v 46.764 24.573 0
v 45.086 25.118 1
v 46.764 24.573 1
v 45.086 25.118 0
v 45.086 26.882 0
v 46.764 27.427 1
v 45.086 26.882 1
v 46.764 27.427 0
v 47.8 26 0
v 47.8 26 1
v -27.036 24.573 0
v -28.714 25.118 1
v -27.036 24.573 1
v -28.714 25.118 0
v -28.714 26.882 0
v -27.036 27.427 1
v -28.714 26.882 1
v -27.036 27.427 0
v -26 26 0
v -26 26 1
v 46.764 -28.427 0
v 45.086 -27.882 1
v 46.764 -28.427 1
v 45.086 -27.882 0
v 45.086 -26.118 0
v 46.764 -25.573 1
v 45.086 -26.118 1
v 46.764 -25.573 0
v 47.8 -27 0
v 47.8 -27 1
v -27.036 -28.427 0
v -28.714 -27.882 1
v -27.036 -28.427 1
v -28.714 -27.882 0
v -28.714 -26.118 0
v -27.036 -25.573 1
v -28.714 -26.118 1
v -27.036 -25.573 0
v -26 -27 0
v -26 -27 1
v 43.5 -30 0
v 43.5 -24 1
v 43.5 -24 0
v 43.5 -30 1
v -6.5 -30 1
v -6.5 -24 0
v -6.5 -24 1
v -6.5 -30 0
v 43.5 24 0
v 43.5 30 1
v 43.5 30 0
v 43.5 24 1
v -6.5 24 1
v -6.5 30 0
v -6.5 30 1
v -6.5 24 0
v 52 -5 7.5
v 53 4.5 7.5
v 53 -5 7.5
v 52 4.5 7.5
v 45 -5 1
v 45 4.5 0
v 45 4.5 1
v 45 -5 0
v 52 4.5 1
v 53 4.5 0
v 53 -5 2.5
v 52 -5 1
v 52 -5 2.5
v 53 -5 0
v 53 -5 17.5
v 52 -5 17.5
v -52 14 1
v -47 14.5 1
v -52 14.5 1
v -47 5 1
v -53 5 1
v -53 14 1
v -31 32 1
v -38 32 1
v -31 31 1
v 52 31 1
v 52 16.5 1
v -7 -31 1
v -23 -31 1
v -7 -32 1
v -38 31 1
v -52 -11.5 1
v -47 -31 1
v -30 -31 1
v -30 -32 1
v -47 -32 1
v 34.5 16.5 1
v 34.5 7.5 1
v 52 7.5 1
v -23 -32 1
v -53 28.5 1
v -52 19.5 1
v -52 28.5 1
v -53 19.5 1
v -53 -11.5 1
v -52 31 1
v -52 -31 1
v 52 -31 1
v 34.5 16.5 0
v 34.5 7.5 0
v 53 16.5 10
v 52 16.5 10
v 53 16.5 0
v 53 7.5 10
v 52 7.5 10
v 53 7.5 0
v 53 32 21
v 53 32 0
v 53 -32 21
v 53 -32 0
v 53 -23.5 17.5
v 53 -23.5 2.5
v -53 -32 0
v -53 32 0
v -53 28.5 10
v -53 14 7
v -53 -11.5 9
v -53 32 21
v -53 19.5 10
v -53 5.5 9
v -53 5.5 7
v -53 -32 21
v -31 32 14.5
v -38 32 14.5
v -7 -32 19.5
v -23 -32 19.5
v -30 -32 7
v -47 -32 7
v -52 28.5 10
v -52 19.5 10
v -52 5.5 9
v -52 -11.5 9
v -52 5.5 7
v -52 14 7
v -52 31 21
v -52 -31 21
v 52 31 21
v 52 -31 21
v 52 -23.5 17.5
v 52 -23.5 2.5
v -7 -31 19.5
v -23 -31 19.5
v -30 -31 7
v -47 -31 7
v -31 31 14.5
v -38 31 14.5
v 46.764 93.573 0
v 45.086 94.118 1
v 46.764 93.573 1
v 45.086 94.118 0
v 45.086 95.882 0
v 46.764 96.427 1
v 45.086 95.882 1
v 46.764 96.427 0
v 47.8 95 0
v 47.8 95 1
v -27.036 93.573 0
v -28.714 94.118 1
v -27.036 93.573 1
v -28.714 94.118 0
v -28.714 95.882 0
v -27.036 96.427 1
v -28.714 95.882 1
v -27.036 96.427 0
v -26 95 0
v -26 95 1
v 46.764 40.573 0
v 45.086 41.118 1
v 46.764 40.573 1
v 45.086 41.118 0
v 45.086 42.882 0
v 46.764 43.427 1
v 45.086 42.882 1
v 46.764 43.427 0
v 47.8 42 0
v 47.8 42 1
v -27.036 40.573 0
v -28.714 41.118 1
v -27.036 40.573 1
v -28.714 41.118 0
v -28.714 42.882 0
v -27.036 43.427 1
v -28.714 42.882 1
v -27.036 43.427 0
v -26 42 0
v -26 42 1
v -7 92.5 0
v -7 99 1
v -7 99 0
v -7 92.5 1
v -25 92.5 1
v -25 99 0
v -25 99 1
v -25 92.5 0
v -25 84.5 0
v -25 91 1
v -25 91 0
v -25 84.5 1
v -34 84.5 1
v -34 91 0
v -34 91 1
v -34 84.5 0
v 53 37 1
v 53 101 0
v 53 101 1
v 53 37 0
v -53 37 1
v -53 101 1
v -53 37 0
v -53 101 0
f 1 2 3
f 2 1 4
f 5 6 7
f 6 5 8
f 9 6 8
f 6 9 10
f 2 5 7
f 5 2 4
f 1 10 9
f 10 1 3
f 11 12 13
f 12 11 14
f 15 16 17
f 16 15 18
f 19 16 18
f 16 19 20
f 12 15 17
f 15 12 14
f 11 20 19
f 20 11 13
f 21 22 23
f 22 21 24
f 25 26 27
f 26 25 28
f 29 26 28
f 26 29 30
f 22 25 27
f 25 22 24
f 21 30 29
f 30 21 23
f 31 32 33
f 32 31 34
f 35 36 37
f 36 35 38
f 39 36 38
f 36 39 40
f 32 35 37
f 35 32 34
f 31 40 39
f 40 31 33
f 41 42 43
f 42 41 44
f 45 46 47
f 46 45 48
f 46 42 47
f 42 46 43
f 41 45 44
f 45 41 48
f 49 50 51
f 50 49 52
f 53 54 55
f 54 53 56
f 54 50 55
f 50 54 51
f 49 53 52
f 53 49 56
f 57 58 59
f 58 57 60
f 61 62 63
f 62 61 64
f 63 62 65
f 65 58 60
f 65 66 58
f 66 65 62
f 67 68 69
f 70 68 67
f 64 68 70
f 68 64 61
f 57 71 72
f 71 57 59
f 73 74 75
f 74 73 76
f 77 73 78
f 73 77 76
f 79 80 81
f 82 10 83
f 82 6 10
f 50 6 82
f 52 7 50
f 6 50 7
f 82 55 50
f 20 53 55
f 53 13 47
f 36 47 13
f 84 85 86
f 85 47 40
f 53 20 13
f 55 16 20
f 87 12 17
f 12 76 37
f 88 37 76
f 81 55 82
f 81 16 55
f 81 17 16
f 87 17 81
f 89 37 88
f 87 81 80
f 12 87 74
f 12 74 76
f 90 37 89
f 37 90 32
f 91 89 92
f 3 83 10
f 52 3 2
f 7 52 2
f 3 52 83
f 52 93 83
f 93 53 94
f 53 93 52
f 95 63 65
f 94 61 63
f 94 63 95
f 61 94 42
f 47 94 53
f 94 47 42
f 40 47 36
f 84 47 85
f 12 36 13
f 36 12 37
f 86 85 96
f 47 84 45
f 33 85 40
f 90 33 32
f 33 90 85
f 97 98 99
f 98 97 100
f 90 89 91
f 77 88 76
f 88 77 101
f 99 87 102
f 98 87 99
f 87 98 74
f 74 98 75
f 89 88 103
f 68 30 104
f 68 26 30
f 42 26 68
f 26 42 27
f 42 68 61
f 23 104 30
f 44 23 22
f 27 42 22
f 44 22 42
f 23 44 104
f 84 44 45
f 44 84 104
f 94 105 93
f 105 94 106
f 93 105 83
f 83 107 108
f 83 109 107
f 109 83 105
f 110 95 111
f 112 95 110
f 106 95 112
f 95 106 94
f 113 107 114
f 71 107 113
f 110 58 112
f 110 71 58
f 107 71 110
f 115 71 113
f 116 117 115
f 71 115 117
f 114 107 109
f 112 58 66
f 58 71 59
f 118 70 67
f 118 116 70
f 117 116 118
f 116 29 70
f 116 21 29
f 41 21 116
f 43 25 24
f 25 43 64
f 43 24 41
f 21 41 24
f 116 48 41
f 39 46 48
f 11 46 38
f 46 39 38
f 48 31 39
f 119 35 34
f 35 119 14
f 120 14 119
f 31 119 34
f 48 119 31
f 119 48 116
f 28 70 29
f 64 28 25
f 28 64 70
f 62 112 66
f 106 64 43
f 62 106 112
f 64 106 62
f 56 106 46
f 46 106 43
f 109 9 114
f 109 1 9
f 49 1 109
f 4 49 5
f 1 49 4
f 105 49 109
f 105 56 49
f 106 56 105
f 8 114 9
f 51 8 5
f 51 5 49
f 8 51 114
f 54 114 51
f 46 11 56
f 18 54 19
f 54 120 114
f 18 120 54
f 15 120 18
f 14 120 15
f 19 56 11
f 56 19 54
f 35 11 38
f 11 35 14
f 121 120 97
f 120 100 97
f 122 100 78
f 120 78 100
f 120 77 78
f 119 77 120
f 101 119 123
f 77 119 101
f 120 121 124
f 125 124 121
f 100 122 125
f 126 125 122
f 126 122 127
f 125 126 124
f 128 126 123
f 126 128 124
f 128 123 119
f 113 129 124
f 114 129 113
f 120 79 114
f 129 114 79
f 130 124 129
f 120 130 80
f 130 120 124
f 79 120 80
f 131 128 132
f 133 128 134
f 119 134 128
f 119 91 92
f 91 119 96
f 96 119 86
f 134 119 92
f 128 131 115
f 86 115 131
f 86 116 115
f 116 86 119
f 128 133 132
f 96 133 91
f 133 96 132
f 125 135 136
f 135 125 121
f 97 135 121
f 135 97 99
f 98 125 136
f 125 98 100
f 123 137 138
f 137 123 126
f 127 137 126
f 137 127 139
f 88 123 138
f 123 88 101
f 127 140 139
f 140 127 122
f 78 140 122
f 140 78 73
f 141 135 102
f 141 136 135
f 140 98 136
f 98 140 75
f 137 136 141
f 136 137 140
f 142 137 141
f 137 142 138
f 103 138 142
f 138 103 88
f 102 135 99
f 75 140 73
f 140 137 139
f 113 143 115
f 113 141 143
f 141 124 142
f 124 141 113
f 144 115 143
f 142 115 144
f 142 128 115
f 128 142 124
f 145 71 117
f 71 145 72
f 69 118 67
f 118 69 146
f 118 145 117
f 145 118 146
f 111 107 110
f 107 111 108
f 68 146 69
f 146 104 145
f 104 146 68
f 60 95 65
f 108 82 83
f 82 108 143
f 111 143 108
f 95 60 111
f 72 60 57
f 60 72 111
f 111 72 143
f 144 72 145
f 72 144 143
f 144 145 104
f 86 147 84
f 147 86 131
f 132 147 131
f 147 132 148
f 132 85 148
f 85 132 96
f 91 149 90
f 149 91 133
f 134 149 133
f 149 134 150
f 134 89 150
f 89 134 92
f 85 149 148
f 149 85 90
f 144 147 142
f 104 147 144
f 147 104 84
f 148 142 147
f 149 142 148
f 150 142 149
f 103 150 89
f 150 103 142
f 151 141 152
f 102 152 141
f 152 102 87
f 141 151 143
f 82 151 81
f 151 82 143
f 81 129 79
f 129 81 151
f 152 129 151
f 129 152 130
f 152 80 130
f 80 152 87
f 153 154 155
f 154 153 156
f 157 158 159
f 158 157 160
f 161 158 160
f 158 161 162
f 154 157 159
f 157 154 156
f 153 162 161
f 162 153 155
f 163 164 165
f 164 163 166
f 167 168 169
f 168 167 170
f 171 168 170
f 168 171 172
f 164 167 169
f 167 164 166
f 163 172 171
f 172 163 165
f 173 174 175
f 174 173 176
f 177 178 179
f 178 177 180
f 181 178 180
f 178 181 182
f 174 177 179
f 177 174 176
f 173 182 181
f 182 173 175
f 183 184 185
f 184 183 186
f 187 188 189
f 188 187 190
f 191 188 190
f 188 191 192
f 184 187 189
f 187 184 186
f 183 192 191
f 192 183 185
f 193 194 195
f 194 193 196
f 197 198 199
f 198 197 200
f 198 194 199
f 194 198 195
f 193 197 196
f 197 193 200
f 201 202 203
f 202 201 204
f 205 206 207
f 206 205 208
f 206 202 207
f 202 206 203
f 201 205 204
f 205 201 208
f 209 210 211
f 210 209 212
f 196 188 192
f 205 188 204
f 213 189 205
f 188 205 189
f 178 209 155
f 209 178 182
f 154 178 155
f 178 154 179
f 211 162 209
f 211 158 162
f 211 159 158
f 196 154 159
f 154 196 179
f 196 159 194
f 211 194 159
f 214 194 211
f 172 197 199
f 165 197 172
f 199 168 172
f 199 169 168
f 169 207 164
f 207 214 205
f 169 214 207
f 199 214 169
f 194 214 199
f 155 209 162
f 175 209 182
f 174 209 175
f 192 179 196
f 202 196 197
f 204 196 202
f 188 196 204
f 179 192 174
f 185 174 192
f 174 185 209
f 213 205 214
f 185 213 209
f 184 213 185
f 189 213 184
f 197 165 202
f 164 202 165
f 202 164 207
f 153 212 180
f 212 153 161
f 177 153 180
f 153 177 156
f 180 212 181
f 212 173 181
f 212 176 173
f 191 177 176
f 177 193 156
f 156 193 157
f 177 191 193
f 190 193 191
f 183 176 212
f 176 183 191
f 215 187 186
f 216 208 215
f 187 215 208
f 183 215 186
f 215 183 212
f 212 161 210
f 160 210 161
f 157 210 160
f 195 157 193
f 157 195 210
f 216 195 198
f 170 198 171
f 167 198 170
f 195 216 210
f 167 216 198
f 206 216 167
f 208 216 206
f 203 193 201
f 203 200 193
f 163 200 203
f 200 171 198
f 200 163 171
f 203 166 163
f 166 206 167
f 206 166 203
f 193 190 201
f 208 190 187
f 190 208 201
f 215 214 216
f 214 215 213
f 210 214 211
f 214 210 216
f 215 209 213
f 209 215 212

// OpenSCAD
/*
  Cubieboard - Case v1
  http://www.thingiverse.com/thing:40144
  by kobaan
  based on buZztiaan's Fake Cubieboard http://www.thingiverse.com/thing:39337
*/

// parametrics
board_width=106;
board_depth=64;
board_height=20;
board_thick=1;
wall_thick=1;
tap_dia=3;
tap_dist=3;
tap_left=23;
tap_right=tap_dist;
tap_height=25;
ether_depth=16;
ether_width=16;
ether_height=13;
hdmi_width=16;
usb_width=14;
usb_height=16.5;
usb_depth=20;
plugbar_width=50;
plugbar_depth=6;
plugbar_height=7;

// crosscheck import STL of cubieboard
//color ("darkgreen") translate([-board_width/2+1.5,-board_depth/2,1+board_thick+wall_thick]) import("Cubieboard_v9.stl");

// taps
module taps() {
 union() {
  translate([board_width/2-3-tap_dist-0.7,board_depth/2-3-tap_dist,-1]) cylinder(tap_height+2,tap_dia/2,tap_dia/2);
  translate([tap_left-board_width/2+2.5,board_depth/2-3-tap_dist,-1]) cylinder(tap_height+2,tap_dia/2,tap_dia/2);
  translate([board_width/2-3-tap_dist-0.7,-board_depth/2+2+tap_dist,-1]) cylinder(tap_height+2,tap_dia/2,tap_dia/2);
  translate([tap_left-board_width/2+2.5,-board_depth/2+2+tap_dist,-1]) cylinder(tap_height+2,tap_dia/2,tap_dia/2);
 }
}

// plugbars
module plugbars() {
 union() {
  translate([-6.5,-board_depth/2+2,-7]) cube([plugbar_width,plugbar_depth,plugbar_height+2]);
  translate([-6.5,board_depth/2-plugbar_depth-2,-7]) cube([plugbar_width,plugbar_depth,plugbar_height+2]);
 }
}

// ether
module ether() {
 translate([board_width/2-ether_width,-23.5,2.5]) cube([ether_width+2,ether_depth+0.5+2,ether_height+2]);
}

// usb
module usb() {
 translate([-23,-40,1]) cube([usb_width+2,usb_depth+2,usb_height+2]);
}

// audio
module audio() {
 translate([34.5,7.5,-5]) cube([19+2,7+2,13+2]);
}

// ir
module ir() {
 translate([-38,25,1]) cube([5+2,7.5+2,11.5+2]);
}

// dcjack
module dcjack() {
 translate([-54,19.5,1]) cube([5+2,7+2,7+2]);
}

// usbfel
module usbfel() {
 translate([45,-5,-5]) cube([10+2,7.5+2,10.5+2]);
 translate([-54,5,1]) cube([5+2,7.5+2,4.5+2]);
}

// hdmi
module hdmi() {
 translate([-55,-11.5,1]) cube([15+2,15+2,6+2]);
}

// power
module power() {
 translate([-55,5,1]) cube([10+2,7+2,4+2]);
}

// sata
module sata() {
 translate([-25,23.5,1]) cube([16+2,4.5+2,19+2]);
}

// satapwr
module satapwr() {
 translate([-34,15.5,1]) cube([7+2,4.5+2,19+2]);
}

// sdcard
module sdcard() {
 translate([-47,-35,1]) cube([15+2,15+2,4+2]);
}

// deletion bottom plate
module delbottom() {
 union() {
   taps();
   plugbars();
   audio();
   usbfel();
 }
}

// deletion upper plate
module delupper() {
 union() {
  taps();
  sata();
  satapwr();
 }
}

// deletion left wall
module delleft() {
 union() {
  dcjack();
  hdmi();
  power();
 }
}

// deletion right wall
module delright() {
 union() {
  ether();
  audio();
  usbfel();
 }
}

// deletion front wall
module delfront() {
 union() {
  usb();
  sdcard();
 }
}

// deletion rear wall
module delrear() {
 union() {
  ir();
 }
}


// bottom plate
module bottom() {
 difference() {
  union() {
   translate([-board_width/2,-board_depth/2,0]) cube([board_width,board_depth,wall_thick]);
  }
  delbottom();
 }
}

// upper plate
module upper() {
 difference() {
  union() {
   translate([-board_width/2,-board_depth/2,board_height]) cube([board_width,board_depth,wall_thick]);
  }
  delupper();
 }
}

// left wall
module left() {
 difference() {
  union() {
   color ("green") translate([-board_width/2,-board_depth/2,wall_thick]) cube([wall_thick,board_depth,board_height]);
  }
  delleft();
 }
}

// right wall
module right() {
 difference() {
  union() {
   color ("pink") translate([board_width/2-wall_thick,-board_depth/2,wall_thick]) cube([wall_thick,board_depth,board_height]);
  }
  delright();
 }
}

// front wall
module front() {
 difference() {
  union() {
   color ("blue") translate([-board_width/2,-board_depth/2,wall_thick]) cube([board_width,wall_thick,board_height]);
  }
  delfront();
 }
}

// rear wall
module rear() {
 difference() {
  union() {
   color ("orange") translate([-board_width/2,board_depth/2-wall_thick,wall_thick]) cube([board_width,wall_thick,board_height]);
  }
  delrear();
 }
}




// 3d print part 1 - case
bottom();
left();
right();
front();
rear();


// 3d print part 2 - cover
//upper();
translate([0,board_depth+5,-board_height]) upper();

// Debug
//taps();
//plugbars();
//ether();
//usb();
//audio();
//ir();
//sata();
//satapwr();
//dcjack();
//usbfel();
//hdmi();
//sdcard();
//power();
